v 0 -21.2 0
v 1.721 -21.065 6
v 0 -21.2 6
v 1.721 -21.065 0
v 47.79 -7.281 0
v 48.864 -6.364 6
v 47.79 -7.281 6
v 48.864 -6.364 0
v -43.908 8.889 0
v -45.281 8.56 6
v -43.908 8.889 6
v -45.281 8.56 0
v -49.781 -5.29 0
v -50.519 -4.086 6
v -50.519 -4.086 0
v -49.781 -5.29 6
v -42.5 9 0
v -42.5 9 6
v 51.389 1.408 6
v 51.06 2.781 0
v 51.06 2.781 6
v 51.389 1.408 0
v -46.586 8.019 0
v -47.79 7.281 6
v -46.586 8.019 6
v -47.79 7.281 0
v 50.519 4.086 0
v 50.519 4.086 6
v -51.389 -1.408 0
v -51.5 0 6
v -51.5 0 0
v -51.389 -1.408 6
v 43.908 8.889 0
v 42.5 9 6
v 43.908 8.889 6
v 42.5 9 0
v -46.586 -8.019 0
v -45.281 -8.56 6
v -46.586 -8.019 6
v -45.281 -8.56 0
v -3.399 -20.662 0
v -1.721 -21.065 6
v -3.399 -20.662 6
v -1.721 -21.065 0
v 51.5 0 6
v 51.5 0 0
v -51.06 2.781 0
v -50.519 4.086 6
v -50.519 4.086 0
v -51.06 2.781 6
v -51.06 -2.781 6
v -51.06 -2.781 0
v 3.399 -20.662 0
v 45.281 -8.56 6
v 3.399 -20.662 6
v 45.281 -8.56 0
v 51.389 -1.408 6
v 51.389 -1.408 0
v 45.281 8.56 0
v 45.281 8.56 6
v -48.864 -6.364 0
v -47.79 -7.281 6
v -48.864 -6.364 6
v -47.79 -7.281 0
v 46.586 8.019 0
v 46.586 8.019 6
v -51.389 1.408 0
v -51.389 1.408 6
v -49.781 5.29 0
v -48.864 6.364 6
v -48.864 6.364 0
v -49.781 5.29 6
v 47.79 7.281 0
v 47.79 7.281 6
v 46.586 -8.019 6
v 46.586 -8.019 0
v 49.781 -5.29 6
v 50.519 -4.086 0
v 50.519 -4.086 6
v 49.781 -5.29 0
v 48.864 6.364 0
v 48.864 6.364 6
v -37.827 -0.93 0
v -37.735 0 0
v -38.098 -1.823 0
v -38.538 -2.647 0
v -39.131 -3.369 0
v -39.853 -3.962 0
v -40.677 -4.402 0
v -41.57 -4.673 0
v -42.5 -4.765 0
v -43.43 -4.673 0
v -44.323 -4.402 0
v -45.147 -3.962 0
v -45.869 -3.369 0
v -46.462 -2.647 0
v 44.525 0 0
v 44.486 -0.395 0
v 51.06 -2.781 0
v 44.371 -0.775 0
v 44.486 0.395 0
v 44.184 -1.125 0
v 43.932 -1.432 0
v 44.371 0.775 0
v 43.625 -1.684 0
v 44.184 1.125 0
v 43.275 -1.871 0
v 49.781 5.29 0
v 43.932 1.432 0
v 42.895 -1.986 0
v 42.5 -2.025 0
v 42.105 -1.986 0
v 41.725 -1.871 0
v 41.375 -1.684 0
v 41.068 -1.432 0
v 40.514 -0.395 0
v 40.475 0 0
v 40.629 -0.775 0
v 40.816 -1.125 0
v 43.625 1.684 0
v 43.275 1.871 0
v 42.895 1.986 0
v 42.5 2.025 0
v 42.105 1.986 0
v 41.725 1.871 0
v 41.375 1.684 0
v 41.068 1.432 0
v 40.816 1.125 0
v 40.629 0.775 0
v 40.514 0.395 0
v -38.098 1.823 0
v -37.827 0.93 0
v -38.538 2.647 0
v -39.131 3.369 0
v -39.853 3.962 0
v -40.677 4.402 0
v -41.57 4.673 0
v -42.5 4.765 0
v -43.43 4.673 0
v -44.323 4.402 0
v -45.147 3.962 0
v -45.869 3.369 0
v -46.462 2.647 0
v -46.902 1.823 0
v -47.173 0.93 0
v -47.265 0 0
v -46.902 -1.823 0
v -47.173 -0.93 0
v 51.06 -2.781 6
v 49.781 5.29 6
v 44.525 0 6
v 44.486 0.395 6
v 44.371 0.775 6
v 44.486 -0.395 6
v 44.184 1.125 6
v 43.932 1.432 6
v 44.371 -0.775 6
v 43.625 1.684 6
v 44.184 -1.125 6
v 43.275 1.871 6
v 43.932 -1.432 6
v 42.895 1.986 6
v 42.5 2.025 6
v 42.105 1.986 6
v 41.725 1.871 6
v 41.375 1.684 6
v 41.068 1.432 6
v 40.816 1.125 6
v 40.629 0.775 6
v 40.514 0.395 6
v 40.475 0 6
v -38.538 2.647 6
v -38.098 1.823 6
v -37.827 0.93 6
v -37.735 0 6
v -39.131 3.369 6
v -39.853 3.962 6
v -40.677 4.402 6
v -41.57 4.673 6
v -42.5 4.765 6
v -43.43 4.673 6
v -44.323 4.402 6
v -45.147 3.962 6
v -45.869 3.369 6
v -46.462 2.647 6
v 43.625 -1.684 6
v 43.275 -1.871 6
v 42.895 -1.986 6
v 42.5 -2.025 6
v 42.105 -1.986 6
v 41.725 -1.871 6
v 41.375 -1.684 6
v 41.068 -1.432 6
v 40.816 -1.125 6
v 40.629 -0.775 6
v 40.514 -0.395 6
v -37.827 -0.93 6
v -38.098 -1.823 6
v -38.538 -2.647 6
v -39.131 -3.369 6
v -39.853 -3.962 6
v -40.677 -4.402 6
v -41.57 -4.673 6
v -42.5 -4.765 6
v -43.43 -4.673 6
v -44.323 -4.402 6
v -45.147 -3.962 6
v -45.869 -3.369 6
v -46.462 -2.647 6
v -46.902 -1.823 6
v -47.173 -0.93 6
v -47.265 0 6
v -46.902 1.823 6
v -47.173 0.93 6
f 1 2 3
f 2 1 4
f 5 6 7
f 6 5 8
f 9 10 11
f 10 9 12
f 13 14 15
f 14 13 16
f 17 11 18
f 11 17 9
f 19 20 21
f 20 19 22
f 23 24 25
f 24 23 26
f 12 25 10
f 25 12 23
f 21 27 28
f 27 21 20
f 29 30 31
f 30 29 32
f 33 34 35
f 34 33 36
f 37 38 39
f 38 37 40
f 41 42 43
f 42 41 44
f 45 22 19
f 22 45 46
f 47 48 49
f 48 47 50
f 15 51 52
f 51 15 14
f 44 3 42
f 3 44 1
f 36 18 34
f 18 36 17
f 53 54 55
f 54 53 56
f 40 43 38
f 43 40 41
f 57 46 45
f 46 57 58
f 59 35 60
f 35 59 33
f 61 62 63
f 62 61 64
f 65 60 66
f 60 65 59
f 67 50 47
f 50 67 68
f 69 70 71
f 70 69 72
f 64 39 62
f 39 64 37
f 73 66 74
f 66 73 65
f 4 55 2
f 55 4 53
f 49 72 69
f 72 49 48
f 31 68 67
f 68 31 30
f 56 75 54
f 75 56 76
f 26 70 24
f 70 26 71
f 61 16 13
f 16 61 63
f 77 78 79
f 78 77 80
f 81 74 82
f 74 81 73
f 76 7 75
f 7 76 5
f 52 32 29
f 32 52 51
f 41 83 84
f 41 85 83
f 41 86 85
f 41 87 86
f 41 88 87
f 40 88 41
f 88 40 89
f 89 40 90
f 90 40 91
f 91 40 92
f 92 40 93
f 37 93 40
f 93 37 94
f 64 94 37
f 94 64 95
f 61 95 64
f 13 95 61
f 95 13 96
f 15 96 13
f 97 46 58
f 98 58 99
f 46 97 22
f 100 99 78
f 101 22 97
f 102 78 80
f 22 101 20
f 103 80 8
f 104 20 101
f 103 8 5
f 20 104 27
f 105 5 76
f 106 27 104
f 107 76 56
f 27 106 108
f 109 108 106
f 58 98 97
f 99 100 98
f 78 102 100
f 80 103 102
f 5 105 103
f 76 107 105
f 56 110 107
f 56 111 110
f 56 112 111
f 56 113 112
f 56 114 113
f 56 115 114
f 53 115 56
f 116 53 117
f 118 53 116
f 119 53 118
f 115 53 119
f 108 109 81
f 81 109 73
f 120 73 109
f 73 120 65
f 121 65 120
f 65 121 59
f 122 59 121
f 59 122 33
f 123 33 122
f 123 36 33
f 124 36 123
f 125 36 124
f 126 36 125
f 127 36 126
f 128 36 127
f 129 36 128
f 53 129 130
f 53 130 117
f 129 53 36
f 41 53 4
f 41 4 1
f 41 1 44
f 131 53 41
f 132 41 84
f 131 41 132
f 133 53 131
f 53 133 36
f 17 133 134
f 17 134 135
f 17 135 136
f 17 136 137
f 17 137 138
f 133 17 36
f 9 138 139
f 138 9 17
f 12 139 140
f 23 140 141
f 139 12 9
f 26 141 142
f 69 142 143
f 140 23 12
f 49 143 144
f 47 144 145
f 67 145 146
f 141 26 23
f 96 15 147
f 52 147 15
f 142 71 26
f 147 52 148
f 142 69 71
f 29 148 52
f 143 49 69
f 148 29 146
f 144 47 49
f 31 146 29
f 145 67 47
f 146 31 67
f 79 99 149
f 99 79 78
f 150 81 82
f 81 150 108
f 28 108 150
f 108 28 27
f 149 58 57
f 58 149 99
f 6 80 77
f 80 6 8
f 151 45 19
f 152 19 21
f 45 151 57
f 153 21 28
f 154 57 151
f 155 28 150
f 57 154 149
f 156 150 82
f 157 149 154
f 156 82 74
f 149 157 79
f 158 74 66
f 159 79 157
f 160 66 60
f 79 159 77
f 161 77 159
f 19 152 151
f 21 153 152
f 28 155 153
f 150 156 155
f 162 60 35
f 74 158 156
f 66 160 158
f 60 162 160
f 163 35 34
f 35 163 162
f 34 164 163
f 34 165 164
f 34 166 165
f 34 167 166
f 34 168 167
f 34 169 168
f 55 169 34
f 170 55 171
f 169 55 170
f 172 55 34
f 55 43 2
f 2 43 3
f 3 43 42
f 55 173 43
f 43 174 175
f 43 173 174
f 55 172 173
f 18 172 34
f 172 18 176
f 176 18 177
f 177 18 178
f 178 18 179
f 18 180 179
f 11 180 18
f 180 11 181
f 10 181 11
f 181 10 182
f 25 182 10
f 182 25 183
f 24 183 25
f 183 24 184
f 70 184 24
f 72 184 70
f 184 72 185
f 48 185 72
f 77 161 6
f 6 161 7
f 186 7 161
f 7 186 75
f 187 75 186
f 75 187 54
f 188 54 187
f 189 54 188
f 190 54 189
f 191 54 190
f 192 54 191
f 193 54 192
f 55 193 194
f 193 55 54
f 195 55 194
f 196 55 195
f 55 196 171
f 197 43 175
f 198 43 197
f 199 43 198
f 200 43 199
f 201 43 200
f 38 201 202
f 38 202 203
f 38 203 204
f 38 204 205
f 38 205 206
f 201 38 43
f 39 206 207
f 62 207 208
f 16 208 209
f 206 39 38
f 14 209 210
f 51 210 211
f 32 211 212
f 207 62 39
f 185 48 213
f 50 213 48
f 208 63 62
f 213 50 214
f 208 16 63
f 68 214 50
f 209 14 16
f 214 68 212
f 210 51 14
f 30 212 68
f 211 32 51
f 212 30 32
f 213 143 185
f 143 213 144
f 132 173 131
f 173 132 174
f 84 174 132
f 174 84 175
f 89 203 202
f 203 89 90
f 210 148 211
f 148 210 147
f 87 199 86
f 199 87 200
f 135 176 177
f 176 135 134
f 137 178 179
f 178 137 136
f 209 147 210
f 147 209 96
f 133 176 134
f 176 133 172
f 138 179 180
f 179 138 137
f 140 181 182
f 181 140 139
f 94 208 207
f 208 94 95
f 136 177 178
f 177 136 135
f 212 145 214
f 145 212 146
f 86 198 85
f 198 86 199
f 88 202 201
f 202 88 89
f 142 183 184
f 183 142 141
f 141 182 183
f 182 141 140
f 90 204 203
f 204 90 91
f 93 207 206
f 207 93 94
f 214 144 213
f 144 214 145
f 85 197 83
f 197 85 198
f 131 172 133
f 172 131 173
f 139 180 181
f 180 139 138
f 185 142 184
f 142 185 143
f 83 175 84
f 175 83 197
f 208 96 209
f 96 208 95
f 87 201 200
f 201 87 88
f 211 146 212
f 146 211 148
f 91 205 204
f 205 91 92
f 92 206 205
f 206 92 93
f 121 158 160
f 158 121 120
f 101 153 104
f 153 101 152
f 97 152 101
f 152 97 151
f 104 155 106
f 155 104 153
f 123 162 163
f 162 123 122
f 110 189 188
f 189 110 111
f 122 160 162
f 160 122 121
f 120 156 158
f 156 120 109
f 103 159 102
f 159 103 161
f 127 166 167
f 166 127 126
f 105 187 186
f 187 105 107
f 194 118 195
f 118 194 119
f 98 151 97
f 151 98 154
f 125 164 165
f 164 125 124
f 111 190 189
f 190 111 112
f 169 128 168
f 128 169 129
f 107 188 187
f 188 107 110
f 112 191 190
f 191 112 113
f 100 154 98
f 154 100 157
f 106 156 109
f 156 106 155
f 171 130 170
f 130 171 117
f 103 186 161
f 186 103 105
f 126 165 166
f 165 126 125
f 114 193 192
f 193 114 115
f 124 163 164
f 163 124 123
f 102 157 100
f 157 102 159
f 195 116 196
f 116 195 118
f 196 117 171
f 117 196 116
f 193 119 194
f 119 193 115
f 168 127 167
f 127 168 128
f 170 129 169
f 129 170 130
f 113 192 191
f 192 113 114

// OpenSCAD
$fn = 32;

// ----------------------------------------------------------------------
// Lever: 85 mm between the bosses, 6 mm thick, smooth outline
// ----------------------------------------------------------------------

// --- parameters (mm) ---
lever_l = 85;             // distance between the boss centres
boss_a = 18;              // first boss diameter
boss_b = 18;              // second boss diameter
bore_a = 9.53;            // first bore
bore_b = 4.05;            // second bore
lever_t = 6;              // lever thickness
boss_c = 22;              // middle boss diameter
bend = 10.2;              // how far the middle boss drops

lever_profile = [[-51.5, 0], [-51.389, -1.408], [-51.06, -2.781], [-50.519, -4.086], [-49.781, -5.29], [-48.864, -6.364], [-47.79, -7.281], [-46.586, -8.019], [-45.281, -8.56], [-3.399, -20.662], [-1.721, -21.065], [0, -21.2], [1.721, -21.065], [3.399, -20.662], [45.281, -8.56], [46.586, -8.019], [47.79, -7.281], [48.864, -6.364], [49.781, -5.29], [50.519, -4.086], [51.06, -2.781], [51.389, -1.408], [51.5, 0], [51.389, 1.408], [51.06, 2.781], [50.519, 4.086], [49.781, 5.29], [48.864, 6.364], [47.79, 7.281], [46.586, 8.019], [45.281, 8.56], [43.908, 8.889], [42.5, 9], [-42.5, 9], [-43.908, 8.889], [-45.281, 8.56], [-46.586, 8.019], [-47.79, 7.281], [-48.864, 6.364], [-49.781, 5.29], [-50.519, 4.086], [-51.06, 2.781], [-51.389, 1.408]];

difference() {
  linear_extrude(height = lever_t) polygon(lever_profile);
  translate([-42.5, 0, -2.5]) cylinder(h = lever_t + 5, d = bore_a);
  translate([42.5, 0, -2.5]) cylinder(h = lever_t + 5, d = bore_b);
}
